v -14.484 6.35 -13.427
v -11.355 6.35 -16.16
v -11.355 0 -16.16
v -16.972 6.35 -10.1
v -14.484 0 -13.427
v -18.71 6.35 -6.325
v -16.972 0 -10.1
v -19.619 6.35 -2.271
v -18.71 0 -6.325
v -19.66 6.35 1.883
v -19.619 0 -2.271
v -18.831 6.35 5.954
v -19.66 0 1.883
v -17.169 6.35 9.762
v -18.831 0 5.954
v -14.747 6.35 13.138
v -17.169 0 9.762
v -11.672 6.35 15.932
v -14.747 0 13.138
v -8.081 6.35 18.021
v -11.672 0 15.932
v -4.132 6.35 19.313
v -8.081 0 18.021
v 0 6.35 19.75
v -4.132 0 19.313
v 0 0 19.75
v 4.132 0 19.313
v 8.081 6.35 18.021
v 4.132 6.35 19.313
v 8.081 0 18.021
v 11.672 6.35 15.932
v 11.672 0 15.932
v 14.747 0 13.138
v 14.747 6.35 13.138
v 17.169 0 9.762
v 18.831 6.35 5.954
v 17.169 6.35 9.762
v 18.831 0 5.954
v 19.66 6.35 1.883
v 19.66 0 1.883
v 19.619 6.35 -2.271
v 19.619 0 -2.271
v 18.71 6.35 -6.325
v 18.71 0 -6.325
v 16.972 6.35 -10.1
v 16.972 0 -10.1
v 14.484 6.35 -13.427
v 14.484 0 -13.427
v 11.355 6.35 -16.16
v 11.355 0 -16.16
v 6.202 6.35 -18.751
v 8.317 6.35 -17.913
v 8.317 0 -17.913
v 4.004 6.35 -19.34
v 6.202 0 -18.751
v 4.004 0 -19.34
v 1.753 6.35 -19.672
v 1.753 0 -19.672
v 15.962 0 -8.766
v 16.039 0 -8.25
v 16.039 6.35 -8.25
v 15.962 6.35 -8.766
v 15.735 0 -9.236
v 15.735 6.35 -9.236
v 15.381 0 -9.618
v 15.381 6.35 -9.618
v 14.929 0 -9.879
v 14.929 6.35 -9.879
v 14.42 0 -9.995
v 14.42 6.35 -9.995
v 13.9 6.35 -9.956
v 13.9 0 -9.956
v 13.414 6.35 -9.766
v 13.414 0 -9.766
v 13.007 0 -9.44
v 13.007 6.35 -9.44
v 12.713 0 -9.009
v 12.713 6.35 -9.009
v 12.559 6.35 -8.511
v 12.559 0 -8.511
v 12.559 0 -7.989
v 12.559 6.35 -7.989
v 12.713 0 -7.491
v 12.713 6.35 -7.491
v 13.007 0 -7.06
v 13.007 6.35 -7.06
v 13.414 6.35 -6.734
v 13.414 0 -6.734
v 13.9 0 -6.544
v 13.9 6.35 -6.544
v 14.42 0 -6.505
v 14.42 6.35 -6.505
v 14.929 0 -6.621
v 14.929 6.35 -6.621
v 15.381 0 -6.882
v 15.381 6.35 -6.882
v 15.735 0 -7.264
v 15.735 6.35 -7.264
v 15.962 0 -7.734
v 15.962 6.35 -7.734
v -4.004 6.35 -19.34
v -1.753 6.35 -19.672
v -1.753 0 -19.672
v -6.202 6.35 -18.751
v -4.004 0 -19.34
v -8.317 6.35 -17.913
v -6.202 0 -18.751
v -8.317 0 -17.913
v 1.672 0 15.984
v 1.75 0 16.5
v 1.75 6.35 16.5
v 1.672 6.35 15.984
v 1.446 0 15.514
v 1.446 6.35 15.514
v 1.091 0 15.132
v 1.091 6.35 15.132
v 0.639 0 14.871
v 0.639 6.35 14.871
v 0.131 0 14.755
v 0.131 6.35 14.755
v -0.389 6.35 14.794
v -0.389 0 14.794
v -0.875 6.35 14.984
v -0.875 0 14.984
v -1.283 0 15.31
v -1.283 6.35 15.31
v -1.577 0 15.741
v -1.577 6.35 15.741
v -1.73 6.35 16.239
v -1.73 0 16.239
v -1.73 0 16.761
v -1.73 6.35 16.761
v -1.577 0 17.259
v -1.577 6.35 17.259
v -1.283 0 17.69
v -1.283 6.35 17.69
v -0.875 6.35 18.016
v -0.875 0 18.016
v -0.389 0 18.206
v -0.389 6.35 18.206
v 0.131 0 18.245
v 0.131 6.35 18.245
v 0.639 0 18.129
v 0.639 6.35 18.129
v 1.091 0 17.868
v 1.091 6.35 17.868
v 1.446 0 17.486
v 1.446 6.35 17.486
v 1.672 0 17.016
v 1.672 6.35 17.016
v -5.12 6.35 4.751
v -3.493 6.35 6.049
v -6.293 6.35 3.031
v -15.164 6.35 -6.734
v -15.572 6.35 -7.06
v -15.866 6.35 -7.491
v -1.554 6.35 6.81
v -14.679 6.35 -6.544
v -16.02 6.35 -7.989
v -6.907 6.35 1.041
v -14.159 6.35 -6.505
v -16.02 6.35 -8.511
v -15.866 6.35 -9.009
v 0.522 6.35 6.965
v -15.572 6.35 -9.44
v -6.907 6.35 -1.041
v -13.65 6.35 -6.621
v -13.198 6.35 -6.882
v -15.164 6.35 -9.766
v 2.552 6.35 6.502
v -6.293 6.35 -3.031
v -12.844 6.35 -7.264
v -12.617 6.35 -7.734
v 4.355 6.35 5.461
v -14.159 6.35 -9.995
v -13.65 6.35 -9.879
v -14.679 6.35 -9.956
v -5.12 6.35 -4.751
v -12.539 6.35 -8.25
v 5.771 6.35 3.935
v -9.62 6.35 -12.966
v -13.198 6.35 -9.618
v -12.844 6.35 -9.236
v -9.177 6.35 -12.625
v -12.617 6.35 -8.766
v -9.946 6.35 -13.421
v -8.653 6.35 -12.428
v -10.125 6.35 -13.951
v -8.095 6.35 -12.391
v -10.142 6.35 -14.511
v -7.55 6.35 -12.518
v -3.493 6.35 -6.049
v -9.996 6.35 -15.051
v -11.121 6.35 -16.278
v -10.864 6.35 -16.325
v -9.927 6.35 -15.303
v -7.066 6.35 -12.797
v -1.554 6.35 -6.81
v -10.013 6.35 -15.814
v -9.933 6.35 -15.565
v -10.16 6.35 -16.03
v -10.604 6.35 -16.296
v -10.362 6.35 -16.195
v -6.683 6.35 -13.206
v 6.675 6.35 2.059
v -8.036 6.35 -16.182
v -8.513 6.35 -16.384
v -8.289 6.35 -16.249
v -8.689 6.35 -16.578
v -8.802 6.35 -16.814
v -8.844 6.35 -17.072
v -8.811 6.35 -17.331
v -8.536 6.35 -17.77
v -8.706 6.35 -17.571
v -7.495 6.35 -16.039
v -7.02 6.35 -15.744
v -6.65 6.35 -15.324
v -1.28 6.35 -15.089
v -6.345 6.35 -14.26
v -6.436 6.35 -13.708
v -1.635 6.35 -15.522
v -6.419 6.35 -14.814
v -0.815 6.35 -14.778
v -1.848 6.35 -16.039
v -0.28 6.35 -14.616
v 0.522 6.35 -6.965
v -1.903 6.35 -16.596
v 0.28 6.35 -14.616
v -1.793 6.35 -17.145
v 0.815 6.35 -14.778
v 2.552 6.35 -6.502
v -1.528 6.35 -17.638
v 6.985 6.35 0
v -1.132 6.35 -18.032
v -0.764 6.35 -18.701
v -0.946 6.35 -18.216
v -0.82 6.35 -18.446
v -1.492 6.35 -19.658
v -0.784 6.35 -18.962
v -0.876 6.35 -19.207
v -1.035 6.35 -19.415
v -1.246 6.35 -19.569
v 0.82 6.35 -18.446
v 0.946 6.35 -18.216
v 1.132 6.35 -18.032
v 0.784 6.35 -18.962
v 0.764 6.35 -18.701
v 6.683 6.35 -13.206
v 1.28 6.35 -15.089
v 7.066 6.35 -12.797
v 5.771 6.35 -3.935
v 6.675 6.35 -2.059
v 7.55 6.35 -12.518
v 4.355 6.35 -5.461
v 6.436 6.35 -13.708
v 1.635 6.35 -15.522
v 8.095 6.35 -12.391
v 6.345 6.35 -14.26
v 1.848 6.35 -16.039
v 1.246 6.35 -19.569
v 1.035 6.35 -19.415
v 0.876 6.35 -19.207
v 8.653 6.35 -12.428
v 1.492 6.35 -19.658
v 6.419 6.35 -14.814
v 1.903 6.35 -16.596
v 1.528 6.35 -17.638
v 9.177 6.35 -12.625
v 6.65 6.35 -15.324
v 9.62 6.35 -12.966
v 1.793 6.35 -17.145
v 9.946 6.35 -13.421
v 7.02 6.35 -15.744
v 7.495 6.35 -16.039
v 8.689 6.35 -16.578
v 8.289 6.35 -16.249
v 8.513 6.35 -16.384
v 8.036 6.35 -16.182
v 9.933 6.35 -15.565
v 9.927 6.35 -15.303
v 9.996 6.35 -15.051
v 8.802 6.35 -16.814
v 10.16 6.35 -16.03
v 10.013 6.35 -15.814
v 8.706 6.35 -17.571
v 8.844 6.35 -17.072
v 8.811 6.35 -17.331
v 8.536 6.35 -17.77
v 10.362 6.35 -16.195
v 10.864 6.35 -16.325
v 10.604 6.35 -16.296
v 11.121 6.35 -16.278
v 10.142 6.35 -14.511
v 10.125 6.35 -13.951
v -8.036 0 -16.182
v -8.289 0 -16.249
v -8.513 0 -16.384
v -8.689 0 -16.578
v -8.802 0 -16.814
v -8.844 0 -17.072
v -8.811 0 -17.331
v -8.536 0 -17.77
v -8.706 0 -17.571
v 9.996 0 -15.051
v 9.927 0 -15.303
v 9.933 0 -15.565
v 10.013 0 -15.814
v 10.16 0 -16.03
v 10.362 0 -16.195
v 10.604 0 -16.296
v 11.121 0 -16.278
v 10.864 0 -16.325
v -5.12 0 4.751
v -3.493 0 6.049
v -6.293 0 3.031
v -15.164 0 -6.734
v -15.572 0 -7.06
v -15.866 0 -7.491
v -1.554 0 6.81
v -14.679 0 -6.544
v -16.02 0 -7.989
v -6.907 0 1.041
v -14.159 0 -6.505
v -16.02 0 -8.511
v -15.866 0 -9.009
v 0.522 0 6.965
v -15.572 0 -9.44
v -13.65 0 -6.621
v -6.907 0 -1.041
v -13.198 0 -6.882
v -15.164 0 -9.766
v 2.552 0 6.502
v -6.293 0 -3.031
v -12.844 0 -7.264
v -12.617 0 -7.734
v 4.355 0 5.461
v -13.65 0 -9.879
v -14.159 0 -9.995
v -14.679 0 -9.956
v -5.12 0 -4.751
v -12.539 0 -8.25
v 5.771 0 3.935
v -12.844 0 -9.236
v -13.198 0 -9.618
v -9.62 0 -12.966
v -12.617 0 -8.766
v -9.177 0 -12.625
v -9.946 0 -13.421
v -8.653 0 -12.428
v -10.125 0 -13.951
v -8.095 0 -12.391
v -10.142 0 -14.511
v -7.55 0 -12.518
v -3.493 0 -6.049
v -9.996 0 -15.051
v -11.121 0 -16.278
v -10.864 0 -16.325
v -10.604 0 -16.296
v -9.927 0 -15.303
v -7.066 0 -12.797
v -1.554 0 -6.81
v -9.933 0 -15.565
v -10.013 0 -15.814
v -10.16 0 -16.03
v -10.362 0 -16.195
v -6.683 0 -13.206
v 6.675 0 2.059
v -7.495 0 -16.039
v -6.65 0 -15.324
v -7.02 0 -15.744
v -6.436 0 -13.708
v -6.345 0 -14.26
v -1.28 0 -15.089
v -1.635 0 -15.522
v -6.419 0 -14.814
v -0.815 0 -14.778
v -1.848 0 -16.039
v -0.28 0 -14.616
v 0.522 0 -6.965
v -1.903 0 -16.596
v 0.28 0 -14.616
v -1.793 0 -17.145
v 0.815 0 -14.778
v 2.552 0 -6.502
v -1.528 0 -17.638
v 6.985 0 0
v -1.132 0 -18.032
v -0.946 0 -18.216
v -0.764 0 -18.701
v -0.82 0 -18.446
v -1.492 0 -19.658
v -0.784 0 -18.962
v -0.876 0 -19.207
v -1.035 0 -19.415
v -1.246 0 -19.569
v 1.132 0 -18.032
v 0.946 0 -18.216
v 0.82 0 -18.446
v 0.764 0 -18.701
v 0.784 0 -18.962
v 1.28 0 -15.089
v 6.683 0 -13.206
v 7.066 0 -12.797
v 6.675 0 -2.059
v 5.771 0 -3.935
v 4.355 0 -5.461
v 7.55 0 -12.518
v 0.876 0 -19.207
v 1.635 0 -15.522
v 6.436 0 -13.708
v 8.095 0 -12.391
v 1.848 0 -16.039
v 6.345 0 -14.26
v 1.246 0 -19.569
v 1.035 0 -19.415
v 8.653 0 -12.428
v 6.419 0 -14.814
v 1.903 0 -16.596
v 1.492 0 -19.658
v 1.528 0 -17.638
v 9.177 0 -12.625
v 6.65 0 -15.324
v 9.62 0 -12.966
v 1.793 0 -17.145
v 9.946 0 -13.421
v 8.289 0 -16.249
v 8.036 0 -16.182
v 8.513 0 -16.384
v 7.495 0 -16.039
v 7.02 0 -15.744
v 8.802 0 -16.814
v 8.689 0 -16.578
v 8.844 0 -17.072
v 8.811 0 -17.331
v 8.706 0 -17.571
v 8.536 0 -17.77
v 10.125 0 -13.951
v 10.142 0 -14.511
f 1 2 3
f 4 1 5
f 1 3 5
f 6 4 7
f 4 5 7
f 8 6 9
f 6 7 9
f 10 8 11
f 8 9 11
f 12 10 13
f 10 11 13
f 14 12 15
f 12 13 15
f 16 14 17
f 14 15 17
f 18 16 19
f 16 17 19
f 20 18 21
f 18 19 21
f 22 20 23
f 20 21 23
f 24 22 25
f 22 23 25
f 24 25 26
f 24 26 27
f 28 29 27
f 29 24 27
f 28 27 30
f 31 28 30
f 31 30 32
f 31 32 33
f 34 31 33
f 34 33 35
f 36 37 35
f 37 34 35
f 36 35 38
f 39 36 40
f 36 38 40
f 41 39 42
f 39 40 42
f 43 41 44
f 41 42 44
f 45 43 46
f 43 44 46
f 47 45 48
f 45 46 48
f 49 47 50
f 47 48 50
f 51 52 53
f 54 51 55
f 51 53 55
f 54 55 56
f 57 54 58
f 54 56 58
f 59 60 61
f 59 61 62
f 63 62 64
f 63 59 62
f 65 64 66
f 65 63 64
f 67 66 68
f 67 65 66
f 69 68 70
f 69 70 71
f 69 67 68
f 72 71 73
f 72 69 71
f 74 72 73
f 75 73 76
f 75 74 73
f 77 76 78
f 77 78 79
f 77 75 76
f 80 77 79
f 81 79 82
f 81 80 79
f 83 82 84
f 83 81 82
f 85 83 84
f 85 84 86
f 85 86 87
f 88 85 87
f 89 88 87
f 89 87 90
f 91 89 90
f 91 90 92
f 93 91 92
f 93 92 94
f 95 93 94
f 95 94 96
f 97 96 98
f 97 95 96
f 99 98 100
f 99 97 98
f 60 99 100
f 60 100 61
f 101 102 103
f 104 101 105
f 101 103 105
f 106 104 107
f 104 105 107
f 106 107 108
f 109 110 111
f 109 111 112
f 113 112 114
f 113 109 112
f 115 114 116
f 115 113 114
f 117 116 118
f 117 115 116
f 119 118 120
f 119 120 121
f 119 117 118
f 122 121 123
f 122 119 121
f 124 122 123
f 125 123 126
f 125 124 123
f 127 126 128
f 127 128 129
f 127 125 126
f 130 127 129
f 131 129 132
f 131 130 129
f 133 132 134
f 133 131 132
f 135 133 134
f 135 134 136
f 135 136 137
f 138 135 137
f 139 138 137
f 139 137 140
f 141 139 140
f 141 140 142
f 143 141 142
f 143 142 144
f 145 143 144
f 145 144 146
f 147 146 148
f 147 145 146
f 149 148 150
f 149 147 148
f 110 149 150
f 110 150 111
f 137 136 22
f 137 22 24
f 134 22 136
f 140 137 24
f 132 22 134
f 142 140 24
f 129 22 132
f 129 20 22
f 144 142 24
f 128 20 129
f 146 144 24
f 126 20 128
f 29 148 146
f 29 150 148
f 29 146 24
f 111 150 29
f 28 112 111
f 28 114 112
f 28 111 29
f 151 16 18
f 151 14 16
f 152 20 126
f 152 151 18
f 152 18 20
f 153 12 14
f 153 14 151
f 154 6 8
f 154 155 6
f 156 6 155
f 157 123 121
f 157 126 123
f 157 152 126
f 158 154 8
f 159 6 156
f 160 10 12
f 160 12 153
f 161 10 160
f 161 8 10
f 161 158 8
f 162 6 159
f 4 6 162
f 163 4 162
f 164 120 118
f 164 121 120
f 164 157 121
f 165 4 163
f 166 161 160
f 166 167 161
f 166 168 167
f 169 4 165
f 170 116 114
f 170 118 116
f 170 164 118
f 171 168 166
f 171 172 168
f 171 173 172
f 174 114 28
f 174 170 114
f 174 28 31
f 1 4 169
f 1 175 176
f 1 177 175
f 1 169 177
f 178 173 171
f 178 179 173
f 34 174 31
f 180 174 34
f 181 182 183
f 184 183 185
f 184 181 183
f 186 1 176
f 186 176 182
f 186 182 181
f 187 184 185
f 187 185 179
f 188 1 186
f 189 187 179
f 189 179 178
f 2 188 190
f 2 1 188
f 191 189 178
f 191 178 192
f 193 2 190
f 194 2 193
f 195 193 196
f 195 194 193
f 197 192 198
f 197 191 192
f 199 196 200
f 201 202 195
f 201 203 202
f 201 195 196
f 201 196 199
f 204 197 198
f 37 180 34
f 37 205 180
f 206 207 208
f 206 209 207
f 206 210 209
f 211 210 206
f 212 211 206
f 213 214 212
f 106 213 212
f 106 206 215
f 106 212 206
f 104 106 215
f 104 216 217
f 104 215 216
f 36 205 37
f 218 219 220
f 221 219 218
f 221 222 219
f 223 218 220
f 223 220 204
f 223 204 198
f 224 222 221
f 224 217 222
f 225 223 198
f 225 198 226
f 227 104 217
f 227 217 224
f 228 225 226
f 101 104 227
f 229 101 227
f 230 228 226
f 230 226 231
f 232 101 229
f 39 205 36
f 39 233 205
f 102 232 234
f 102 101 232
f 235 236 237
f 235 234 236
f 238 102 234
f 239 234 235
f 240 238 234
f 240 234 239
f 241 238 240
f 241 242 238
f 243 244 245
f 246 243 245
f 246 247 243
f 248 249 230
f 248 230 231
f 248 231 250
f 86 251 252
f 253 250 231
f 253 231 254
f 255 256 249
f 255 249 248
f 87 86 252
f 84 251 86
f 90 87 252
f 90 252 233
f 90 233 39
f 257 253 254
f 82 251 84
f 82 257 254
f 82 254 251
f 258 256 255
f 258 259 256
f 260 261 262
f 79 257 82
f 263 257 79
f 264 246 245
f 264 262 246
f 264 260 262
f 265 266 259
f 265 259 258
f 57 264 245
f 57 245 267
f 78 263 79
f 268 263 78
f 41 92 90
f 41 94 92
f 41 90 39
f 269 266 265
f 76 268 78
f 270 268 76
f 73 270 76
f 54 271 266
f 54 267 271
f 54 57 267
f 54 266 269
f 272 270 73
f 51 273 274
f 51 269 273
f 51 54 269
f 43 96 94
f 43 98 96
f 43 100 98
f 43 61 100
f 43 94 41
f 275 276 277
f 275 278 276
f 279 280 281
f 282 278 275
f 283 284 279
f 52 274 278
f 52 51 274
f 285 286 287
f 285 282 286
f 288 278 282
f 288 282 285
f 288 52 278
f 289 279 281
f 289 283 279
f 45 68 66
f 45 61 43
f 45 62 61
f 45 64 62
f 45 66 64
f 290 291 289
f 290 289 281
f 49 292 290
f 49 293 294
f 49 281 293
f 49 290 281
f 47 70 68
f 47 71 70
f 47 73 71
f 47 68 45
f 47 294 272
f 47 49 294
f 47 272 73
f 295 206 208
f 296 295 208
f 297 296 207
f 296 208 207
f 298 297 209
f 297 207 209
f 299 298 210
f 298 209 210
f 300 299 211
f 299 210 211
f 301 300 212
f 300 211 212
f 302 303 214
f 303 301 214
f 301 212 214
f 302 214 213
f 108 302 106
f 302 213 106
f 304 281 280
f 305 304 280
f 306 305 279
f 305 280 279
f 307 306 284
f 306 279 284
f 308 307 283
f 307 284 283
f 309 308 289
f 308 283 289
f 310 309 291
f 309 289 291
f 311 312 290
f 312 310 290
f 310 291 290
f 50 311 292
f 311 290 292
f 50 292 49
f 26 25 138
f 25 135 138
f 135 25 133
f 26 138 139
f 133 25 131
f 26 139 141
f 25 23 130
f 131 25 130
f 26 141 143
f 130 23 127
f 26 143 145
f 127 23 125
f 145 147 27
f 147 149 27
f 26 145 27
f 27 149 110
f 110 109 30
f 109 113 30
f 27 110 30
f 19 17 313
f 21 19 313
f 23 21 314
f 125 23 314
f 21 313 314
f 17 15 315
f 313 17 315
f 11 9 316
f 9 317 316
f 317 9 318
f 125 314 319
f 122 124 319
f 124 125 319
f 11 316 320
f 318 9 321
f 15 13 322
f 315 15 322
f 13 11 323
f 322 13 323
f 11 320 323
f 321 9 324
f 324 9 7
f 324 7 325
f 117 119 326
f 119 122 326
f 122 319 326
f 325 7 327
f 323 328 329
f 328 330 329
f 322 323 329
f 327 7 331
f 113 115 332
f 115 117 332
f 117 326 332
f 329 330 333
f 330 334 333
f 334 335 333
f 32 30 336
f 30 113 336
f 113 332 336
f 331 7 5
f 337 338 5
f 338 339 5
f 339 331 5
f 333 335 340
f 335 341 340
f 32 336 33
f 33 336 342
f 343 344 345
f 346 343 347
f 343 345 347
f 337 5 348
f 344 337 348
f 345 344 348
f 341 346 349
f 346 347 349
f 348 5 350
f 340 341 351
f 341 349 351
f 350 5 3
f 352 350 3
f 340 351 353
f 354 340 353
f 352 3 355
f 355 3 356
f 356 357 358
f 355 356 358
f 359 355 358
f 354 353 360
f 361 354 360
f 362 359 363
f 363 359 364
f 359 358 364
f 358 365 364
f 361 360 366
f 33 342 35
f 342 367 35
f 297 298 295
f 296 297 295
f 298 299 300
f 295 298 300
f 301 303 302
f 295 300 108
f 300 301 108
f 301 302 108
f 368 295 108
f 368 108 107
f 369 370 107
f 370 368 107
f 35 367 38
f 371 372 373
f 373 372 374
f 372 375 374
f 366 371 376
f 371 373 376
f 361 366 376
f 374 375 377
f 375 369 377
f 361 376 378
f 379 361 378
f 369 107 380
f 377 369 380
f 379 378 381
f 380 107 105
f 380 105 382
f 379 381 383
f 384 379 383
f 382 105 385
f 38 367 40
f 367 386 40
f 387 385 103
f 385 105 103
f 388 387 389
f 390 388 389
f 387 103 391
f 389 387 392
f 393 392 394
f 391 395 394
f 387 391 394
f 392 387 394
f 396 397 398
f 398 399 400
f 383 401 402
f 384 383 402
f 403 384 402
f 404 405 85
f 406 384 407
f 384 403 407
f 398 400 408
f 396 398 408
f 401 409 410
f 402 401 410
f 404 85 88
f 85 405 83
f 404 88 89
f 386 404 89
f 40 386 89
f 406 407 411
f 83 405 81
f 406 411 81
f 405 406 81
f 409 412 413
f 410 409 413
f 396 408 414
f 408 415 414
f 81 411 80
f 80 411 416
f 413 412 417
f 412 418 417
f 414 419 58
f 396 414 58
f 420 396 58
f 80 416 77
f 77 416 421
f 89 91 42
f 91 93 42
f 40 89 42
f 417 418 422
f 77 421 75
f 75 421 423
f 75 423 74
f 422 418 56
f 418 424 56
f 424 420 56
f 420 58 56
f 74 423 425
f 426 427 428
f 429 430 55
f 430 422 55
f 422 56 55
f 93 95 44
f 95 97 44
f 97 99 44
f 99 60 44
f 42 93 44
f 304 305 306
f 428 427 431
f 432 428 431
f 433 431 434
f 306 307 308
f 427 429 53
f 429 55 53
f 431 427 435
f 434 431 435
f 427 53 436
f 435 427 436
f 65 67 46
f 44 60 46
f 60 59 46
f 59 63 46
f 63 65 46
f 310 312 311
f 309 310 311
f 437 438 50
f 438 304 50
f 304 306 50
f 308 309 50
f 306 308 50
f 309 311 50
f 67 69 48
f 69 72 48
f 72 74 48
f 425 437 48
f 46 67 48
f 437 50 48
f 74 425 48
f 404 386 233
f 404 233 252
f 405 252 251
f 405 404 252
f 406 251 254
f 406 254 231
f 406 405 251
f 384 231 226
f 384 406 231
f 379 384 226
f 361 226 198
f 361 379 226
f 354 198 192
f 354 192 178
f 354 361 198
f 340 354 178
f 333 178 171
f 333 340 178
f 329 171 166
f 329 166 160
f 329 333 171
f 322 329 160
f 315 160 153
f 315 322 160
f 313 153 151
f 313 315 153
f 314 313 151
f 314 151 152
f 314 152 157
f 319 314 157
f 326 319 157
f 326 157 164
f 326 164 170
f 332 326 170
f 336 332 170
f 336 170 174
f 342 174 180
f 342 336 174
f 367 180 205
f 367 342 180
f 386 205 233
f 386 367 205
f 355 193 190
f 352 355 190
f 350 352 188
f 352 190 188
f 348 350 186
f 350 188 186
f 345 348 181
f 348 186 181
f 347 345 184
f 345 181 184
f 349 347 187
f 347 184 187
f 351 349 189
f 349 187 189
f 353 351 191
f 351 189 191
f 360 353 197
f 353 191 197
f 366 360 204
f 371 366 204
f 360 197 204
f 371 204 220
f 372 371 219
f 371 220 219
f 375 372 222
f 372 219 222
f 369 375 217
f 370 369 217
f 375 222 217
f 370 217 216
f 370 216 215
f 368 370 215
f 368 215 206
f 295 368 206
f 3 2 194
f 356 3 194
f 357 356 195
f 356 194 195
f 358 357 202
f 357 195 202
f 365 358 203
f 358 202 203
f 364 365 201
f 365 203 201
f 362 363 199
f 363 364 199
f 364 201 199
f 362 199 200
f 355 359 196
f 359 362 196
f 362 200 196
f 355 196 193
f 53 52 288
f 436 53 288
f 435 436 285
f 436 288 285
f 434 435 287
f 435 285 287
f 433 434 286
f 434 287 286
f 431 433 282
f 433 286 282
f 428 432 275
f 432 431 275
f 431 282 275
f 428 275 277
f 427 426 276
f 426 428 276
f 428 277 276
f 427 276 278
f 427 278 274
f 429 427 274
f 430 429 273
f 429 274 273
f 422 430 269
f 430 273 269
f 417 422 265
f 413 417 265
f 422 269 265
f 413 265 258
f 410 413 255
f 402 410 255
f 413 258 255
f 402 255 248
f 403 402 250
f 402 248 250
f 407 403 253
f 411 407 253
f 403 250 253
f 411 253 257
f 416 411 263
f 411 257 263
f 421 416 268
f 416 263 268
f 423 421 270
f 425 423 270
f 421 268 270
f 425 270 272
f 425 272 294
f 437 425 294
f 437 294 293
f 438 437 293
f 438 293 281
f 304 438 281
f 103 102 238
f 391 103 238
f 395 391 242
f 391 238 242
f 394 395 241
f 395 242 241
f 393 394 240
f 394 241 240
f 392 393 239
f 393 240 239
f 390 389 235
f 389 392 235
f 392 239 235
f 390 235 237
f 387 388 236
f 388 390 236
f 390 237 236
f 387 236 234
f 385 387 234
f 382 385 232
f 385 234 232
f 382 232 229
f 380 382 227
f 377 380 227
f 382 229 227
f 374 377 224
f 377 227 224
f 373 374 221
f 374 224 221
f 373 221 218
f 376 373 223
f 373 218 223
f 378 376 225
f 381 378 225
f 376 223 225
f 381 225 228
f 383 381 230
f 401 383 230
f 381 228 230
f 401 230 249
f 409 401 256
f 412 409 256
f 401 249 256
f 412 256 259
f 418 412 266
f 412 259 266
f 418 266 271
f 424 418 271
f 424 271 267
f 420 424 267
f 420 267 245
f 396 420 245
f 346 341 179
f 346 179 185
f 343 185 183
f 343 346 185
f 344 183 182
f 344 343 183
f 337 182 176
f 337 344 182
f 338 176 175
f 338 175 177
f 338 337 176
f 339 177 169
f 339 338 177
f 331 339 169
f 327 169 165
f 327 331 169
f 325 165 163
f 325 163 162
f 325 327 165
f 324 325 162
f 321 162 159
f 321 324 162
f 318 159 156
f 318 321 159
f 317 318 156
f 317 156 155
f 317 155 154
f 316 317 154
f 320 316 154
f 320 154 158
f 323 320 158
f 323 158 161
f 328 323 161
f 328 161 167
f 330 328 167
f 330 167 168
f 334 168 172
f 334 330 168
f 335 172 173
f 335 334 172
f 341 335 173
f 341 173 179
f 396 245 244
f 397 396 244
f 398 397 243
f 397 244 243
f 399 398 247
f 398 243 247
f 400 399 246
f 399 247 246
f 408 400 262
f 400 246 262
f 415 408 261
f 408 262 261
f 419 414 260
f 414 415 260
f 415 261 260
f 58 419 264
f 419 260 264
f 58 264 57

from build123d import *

# Parameters (mm, degrees)
SKETCH1_R           = 19.75
SKETCH1_R_2         = 6.985
SKETCH1_R_3         = 1.75
BOSS_EXTRUDE1_DEPTH = 6.35
CUT_EXTRUDE1_DEPTH  = 7.35
CIRPATTERN1_COUNT   = 3
CIRPATTERN1_ANGLE   = 60


with BuildPart() as part:
    # Sketch1 → Boss-Extrude1 (new body)
    with BuildSketch(Plane(origin=(0, 0, 0), x_dir=(1, 0, 0), z_dir=(0, 1, 0))):
        Circle(SKETCH1_R)
        Circle(SKETCH1_R_2, mode=Mode.SUBTRACT)
        with Locations((-14.289419162, 8.25)):
            Circle(SKETCH1_R_3, mode=Mode.SUBTRACT)
        with Locations((0, -16.5)):
            Circle(SKETCH1_R_3, mode=Mode.SUBTRACT)
        with Locations((14.289419162, 8.25)):
            Circle(SKETCH1_R_3, mode=Mode.SUBTRACT)
    extrude(amount=BOSS_EXTRUDE1_DEPTH)

    # Sketch2 → Cut-Extrude1 (cut, through all)
    with BuildSketch(Plane(origin=(0, 6.35, 0), x_dir=(1, 0, 0), z_dir=(0, 1, 0))):
        with BuildLine():
            ThreePointArc((8.036161973, 16.182379357), (7.2975, 12.639640768), (9.99627063, 15.050710096))
            ThreePointArc((9.99627063, 15.050710096), (10.255103275, 16.120005739), (11.354562521, 16.159715652))
            ThreePointArc((11.354562521, 16.159715652), (9.875, 17.104001725), (8.317443012, 17.913197418))
            ThreePointArc((8.317443012, 17.913197418), (8.832782842, 16.941182824), (8.036161973, 16.182379357))
        make_face()
    cut_extrude1 = extrude(amount=-CUT_EXTRUDE1_DEPTH, mode=Mode.SUBTRACT)

    # CirPattern1: Cut-Extrude1 ×3 about axis
    cirpattern1_axis = Axis((0, 0, 0), (0, 1, 0))
    for i in range(1, CIRPATTERN1_COUNT):
        add(cut_extrude1.rotate(cirpattern1_axis, i * CIRPATTERN1_ANGLE / (CIRPATTERN1_COUNT - 1)), mode=Mode.SUBTRACT)


solid = part.part
